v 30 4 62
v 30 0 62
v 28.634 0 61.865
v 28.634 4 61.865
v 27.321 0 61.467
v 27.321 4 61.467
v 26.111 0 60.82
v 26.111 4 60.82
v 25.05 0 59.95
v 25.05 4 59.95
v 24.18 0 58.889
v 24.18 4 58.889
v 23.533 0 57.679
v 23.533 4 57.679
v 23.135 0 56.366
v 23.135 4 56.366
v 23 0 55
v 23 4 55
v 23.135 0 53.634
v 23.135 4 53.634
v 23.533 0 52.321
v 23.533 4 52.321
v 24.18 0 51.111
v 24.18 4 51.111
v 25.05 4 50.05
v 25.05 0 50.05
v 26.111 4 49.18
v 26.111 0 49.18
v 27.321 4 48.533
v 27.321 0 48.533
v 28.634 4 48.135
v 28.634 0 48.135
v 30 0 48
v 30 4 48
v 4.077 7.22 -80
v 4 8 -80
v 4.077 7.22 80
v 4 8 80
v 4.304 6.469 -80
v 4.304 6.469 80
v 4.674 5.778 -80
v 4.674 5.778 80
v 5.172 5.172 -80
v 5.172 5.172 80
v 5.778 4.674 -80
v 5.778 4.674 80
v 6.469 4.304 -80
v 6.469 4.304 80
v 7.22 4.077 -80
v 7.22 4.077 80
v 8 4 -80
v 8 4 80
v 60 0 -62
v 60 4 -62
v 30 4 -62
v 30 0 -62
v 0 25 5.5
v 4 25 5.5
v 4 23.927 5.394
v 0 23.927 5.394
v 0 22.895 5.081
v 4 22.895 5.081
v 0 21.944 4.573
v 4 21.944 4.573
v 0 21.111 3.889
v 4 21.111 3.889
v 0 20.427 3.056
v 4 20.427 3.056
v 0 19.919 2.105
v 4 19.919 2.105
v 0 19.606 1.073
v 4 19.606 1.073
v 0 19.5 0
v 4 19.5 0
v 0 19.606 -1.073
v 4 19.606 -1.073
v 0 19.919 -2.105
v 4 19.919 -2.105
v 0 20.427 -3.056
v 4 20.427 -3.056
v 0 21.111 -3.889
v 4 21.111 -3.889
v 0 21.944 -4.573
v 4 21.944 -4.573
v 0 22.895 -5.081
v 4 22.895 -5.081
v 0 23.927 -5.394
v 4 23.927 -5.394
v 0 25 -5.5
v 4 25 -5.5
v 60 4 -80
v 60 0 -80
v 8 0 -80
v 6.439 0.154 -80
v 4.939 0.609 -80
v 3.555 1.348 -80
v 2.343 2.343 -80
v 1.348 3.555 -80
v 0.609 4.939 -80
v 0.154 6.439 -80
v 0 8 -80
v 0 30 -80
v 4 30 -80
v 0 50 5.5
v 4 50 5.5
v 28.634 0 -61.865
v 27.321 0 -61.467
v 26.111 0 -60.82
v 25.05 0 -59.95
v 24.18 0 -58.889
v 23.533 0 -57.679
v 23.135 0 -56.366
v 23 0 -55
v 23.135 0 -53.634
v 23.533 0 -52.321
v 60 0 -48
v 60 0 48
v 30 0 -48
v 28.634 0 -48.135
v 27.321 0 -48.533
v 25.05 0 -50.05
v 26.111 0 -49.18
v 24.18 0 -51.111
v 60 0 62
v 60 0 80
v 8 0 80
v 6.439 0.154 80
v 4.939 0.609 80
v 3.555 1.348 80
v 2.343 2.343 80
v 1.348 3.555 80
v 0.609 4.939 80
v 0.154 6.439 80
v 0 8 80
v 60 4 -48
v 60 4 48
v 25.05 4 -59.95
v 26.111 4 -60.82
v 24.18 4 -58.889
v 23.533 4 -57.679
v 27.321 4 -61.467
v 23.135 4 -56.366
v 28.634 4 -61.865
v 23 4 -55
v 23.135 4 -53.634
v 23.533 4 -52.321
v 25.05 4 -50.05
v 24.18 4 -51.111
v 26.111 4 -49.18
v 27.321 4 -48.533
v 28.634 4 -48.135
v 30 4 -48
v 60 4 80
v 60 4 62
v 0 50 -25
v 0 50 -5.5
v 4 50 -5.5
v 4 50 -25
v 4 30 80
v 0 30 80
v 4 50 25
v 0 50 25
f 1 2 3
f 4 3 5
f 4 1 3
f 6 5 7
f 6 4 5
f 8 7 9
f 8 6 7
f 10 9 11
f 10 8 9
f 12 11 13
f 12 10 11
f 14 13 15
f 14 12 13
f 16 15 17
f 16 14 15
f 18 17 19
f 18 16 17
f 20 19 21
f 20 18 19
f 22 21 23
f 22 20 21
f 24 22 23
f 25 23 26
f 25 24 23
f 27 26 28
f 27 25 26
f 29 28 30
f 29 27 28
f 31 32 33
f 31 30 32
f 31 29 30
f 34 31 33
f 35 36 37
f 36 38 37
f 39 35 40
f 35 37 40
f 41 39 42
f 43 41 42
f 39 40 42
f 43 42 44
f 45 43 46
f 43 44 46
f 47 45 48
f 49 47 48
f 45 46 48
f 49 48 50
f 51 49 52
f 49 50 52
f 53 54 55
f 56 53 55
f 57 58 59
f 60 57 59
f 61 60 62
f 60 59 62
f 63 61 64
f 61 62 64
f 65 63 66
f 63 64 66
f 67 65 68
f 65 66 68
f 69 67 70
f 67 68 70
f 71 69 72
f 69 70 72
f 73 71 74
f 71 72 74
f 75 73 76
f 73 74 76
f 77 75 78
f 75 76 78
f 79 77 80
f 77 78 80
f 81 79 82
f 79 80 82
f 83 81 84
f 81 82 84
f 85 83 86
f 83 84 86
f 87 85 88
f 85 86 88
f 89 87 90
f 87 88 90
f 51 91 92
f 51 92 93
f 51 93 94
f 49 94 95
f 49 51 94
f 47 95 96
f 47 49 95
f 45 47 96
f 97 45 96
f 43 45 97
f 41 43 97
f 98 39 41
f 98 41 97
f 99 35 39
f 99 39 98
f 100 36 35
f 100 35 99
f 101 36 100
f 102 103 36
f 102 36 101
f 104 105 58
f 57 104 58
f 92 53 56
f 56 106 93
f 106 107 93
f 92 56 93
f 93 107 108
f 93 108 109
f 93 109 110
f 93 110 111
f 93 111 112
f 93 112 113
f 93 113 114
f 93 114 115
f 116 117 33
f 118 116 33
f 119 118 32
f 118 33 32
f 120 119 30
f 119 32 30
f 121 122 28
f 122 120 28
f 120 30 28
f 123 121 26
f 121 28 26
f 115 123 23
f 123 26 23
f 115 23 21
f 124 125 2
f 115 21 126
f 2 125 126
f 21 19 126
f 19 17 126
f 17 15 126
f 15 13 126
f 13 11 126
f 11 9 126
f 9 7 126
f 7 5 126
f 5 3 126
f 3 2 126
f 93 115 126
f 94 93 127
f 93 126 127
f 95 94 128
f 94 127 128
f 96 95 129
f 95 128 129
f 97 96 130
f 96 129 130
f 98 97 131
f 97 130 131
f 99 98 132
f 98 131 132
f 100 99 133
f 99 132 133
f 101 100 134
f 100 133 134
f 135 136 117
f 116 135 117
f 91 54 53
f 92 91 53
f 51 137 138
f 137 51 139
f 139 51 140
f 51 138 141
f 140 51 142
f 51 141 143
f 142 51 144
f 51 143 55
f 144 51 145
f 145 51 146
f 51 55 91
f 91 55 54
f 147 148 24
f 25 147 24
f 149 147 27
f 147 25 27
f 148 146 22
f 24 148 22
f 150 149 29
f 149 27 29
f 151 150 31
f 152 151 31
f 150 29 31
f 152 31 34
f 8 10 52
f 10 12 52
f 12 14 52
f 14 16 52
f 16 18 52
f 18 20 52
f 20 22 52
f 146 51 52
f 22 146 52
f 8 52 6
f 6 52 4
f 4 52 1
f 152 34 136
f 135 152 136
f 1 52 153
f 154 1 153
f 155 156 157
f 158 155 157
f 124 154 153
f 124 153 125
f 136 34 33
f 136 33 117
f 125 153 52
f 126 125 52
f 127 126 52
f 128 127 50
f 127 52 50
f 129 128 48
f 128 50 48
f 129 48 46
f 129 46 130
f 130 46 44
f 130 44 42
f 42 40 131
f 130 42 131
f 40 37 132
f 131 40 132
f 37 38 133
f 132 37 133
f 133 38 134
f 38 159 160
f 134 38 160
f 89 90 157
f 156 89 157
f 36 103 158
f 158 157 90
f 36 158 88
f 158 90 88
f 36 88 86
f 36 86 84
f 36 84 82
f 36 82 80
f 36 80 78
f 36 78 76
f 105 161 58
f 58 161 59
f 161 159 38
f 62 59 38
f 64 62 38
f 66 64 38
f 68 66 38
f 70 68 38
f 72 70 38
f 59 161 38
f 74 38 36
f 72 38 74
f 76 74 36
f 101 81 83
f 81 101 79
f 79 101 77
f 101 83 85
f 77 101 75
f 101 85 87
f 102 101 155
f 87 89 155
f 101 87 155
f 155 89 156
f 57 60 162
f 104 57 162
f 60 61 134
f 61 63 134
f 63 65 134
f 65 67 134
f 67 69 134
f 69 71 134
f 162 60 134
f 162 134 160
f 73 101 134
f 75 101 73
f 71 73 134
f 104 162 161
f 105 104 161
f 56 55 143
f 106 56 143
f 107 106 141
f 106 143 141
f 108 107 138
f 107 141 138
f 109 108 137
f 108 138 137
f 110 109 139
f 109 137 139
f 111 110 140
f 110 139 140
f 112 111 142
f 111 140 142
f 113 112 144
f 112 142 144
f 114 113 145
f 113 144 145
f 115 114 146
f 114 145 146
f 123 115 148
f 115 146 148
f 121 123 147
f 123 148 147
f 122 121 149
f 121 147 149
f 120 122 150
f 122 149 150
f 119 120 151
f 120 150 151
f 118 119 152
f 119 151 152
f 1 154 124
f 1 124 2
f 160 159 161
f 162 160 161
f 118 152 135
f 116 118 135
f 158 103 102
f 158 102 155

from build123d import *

# Parameters (mm, degrees)
BASE_FLANGE3_DEPTH = 80
CUT_EXTRUDE1_DEPTH = 110.708705215
CUT_EXTRUDE2_DEPTH = 111.072703247


# Sheet-metal steps are written as plain solids
with BuildPart() as part:
    # Sketch1 → Base-Flange3 (new, symmetric)
    with BuildSketch(Plane.XY):
        with BuildLine():
            Line((60, 0), (8, 0))
            ThreePointArc((8, 0), (2.343145751, 2.343145751), (0, 8))
            Line((0, 8), (0, 50))
            Line((0, 50), (4, 50))
            Line((4, 50), (4, 8))
            ThreePointArc((4, 8), (5.171572875, 5.171572875), (8, 4))
            Line((8, 4), (60, 4))
            Line((60, 4), (60, 0))
        make_face()
    extrude(amount=BASE_FLANGE3_DEPTH, both=True)

    # Sketch14 → Cut-Extrude1 (cut, through all)
    with BuildSketch(Plane(origin=(4, 0, 0), x_dir=(0, 0, -1), z_dir=(1, 0, 0))):
        Polygon((-80, 30), (-25, 50), (-80, 50), align=None)
        Polygon((80, 30), (25, 50), (80, 50), align=None)
        with BuildLine():
            Line((-5.5, 50), (-5.5, 25))
            ThreePointArc((-5.5, 25), (0, 19.5), (5.5, 25))
            Line((5.5, 25), (5.5, 50))
            Line((5.5, 50), (-5.5, 50))
        make_face()
    extrude(amount=-CUT_EXTRUDE1_DEPTH, mode=Mode.SUBTRACT)

    # Sketch16 → Cut-Extrude2 (cut, through all)
    with BuildSketch(Plane(origin=(0, 4, 0), x_dir=(1, 0, 0), z_dir=(0, 1, 0))):
        with BuildLine():
            Line((60, 62), (30, 62))
            ThreePointArc((30, 62), (23, 55), (30, 48))
            Line((30, 48), (60, 48))
            Line((60, 48), (60, 62))
        make_face()
        with BuildLine():
            Line((60, -48), (60, -62))
            Line((60, -62), (30, -62))
            ThreePointArc((30, -62), (23, -55), (30, -48))
            Line((30, -48), (60, -48))
        make_face()
    extrude(amount=-CUT_EXTRUDE2_DEPTH, mode=Mode.SUBTRACT)


solid = part.part
